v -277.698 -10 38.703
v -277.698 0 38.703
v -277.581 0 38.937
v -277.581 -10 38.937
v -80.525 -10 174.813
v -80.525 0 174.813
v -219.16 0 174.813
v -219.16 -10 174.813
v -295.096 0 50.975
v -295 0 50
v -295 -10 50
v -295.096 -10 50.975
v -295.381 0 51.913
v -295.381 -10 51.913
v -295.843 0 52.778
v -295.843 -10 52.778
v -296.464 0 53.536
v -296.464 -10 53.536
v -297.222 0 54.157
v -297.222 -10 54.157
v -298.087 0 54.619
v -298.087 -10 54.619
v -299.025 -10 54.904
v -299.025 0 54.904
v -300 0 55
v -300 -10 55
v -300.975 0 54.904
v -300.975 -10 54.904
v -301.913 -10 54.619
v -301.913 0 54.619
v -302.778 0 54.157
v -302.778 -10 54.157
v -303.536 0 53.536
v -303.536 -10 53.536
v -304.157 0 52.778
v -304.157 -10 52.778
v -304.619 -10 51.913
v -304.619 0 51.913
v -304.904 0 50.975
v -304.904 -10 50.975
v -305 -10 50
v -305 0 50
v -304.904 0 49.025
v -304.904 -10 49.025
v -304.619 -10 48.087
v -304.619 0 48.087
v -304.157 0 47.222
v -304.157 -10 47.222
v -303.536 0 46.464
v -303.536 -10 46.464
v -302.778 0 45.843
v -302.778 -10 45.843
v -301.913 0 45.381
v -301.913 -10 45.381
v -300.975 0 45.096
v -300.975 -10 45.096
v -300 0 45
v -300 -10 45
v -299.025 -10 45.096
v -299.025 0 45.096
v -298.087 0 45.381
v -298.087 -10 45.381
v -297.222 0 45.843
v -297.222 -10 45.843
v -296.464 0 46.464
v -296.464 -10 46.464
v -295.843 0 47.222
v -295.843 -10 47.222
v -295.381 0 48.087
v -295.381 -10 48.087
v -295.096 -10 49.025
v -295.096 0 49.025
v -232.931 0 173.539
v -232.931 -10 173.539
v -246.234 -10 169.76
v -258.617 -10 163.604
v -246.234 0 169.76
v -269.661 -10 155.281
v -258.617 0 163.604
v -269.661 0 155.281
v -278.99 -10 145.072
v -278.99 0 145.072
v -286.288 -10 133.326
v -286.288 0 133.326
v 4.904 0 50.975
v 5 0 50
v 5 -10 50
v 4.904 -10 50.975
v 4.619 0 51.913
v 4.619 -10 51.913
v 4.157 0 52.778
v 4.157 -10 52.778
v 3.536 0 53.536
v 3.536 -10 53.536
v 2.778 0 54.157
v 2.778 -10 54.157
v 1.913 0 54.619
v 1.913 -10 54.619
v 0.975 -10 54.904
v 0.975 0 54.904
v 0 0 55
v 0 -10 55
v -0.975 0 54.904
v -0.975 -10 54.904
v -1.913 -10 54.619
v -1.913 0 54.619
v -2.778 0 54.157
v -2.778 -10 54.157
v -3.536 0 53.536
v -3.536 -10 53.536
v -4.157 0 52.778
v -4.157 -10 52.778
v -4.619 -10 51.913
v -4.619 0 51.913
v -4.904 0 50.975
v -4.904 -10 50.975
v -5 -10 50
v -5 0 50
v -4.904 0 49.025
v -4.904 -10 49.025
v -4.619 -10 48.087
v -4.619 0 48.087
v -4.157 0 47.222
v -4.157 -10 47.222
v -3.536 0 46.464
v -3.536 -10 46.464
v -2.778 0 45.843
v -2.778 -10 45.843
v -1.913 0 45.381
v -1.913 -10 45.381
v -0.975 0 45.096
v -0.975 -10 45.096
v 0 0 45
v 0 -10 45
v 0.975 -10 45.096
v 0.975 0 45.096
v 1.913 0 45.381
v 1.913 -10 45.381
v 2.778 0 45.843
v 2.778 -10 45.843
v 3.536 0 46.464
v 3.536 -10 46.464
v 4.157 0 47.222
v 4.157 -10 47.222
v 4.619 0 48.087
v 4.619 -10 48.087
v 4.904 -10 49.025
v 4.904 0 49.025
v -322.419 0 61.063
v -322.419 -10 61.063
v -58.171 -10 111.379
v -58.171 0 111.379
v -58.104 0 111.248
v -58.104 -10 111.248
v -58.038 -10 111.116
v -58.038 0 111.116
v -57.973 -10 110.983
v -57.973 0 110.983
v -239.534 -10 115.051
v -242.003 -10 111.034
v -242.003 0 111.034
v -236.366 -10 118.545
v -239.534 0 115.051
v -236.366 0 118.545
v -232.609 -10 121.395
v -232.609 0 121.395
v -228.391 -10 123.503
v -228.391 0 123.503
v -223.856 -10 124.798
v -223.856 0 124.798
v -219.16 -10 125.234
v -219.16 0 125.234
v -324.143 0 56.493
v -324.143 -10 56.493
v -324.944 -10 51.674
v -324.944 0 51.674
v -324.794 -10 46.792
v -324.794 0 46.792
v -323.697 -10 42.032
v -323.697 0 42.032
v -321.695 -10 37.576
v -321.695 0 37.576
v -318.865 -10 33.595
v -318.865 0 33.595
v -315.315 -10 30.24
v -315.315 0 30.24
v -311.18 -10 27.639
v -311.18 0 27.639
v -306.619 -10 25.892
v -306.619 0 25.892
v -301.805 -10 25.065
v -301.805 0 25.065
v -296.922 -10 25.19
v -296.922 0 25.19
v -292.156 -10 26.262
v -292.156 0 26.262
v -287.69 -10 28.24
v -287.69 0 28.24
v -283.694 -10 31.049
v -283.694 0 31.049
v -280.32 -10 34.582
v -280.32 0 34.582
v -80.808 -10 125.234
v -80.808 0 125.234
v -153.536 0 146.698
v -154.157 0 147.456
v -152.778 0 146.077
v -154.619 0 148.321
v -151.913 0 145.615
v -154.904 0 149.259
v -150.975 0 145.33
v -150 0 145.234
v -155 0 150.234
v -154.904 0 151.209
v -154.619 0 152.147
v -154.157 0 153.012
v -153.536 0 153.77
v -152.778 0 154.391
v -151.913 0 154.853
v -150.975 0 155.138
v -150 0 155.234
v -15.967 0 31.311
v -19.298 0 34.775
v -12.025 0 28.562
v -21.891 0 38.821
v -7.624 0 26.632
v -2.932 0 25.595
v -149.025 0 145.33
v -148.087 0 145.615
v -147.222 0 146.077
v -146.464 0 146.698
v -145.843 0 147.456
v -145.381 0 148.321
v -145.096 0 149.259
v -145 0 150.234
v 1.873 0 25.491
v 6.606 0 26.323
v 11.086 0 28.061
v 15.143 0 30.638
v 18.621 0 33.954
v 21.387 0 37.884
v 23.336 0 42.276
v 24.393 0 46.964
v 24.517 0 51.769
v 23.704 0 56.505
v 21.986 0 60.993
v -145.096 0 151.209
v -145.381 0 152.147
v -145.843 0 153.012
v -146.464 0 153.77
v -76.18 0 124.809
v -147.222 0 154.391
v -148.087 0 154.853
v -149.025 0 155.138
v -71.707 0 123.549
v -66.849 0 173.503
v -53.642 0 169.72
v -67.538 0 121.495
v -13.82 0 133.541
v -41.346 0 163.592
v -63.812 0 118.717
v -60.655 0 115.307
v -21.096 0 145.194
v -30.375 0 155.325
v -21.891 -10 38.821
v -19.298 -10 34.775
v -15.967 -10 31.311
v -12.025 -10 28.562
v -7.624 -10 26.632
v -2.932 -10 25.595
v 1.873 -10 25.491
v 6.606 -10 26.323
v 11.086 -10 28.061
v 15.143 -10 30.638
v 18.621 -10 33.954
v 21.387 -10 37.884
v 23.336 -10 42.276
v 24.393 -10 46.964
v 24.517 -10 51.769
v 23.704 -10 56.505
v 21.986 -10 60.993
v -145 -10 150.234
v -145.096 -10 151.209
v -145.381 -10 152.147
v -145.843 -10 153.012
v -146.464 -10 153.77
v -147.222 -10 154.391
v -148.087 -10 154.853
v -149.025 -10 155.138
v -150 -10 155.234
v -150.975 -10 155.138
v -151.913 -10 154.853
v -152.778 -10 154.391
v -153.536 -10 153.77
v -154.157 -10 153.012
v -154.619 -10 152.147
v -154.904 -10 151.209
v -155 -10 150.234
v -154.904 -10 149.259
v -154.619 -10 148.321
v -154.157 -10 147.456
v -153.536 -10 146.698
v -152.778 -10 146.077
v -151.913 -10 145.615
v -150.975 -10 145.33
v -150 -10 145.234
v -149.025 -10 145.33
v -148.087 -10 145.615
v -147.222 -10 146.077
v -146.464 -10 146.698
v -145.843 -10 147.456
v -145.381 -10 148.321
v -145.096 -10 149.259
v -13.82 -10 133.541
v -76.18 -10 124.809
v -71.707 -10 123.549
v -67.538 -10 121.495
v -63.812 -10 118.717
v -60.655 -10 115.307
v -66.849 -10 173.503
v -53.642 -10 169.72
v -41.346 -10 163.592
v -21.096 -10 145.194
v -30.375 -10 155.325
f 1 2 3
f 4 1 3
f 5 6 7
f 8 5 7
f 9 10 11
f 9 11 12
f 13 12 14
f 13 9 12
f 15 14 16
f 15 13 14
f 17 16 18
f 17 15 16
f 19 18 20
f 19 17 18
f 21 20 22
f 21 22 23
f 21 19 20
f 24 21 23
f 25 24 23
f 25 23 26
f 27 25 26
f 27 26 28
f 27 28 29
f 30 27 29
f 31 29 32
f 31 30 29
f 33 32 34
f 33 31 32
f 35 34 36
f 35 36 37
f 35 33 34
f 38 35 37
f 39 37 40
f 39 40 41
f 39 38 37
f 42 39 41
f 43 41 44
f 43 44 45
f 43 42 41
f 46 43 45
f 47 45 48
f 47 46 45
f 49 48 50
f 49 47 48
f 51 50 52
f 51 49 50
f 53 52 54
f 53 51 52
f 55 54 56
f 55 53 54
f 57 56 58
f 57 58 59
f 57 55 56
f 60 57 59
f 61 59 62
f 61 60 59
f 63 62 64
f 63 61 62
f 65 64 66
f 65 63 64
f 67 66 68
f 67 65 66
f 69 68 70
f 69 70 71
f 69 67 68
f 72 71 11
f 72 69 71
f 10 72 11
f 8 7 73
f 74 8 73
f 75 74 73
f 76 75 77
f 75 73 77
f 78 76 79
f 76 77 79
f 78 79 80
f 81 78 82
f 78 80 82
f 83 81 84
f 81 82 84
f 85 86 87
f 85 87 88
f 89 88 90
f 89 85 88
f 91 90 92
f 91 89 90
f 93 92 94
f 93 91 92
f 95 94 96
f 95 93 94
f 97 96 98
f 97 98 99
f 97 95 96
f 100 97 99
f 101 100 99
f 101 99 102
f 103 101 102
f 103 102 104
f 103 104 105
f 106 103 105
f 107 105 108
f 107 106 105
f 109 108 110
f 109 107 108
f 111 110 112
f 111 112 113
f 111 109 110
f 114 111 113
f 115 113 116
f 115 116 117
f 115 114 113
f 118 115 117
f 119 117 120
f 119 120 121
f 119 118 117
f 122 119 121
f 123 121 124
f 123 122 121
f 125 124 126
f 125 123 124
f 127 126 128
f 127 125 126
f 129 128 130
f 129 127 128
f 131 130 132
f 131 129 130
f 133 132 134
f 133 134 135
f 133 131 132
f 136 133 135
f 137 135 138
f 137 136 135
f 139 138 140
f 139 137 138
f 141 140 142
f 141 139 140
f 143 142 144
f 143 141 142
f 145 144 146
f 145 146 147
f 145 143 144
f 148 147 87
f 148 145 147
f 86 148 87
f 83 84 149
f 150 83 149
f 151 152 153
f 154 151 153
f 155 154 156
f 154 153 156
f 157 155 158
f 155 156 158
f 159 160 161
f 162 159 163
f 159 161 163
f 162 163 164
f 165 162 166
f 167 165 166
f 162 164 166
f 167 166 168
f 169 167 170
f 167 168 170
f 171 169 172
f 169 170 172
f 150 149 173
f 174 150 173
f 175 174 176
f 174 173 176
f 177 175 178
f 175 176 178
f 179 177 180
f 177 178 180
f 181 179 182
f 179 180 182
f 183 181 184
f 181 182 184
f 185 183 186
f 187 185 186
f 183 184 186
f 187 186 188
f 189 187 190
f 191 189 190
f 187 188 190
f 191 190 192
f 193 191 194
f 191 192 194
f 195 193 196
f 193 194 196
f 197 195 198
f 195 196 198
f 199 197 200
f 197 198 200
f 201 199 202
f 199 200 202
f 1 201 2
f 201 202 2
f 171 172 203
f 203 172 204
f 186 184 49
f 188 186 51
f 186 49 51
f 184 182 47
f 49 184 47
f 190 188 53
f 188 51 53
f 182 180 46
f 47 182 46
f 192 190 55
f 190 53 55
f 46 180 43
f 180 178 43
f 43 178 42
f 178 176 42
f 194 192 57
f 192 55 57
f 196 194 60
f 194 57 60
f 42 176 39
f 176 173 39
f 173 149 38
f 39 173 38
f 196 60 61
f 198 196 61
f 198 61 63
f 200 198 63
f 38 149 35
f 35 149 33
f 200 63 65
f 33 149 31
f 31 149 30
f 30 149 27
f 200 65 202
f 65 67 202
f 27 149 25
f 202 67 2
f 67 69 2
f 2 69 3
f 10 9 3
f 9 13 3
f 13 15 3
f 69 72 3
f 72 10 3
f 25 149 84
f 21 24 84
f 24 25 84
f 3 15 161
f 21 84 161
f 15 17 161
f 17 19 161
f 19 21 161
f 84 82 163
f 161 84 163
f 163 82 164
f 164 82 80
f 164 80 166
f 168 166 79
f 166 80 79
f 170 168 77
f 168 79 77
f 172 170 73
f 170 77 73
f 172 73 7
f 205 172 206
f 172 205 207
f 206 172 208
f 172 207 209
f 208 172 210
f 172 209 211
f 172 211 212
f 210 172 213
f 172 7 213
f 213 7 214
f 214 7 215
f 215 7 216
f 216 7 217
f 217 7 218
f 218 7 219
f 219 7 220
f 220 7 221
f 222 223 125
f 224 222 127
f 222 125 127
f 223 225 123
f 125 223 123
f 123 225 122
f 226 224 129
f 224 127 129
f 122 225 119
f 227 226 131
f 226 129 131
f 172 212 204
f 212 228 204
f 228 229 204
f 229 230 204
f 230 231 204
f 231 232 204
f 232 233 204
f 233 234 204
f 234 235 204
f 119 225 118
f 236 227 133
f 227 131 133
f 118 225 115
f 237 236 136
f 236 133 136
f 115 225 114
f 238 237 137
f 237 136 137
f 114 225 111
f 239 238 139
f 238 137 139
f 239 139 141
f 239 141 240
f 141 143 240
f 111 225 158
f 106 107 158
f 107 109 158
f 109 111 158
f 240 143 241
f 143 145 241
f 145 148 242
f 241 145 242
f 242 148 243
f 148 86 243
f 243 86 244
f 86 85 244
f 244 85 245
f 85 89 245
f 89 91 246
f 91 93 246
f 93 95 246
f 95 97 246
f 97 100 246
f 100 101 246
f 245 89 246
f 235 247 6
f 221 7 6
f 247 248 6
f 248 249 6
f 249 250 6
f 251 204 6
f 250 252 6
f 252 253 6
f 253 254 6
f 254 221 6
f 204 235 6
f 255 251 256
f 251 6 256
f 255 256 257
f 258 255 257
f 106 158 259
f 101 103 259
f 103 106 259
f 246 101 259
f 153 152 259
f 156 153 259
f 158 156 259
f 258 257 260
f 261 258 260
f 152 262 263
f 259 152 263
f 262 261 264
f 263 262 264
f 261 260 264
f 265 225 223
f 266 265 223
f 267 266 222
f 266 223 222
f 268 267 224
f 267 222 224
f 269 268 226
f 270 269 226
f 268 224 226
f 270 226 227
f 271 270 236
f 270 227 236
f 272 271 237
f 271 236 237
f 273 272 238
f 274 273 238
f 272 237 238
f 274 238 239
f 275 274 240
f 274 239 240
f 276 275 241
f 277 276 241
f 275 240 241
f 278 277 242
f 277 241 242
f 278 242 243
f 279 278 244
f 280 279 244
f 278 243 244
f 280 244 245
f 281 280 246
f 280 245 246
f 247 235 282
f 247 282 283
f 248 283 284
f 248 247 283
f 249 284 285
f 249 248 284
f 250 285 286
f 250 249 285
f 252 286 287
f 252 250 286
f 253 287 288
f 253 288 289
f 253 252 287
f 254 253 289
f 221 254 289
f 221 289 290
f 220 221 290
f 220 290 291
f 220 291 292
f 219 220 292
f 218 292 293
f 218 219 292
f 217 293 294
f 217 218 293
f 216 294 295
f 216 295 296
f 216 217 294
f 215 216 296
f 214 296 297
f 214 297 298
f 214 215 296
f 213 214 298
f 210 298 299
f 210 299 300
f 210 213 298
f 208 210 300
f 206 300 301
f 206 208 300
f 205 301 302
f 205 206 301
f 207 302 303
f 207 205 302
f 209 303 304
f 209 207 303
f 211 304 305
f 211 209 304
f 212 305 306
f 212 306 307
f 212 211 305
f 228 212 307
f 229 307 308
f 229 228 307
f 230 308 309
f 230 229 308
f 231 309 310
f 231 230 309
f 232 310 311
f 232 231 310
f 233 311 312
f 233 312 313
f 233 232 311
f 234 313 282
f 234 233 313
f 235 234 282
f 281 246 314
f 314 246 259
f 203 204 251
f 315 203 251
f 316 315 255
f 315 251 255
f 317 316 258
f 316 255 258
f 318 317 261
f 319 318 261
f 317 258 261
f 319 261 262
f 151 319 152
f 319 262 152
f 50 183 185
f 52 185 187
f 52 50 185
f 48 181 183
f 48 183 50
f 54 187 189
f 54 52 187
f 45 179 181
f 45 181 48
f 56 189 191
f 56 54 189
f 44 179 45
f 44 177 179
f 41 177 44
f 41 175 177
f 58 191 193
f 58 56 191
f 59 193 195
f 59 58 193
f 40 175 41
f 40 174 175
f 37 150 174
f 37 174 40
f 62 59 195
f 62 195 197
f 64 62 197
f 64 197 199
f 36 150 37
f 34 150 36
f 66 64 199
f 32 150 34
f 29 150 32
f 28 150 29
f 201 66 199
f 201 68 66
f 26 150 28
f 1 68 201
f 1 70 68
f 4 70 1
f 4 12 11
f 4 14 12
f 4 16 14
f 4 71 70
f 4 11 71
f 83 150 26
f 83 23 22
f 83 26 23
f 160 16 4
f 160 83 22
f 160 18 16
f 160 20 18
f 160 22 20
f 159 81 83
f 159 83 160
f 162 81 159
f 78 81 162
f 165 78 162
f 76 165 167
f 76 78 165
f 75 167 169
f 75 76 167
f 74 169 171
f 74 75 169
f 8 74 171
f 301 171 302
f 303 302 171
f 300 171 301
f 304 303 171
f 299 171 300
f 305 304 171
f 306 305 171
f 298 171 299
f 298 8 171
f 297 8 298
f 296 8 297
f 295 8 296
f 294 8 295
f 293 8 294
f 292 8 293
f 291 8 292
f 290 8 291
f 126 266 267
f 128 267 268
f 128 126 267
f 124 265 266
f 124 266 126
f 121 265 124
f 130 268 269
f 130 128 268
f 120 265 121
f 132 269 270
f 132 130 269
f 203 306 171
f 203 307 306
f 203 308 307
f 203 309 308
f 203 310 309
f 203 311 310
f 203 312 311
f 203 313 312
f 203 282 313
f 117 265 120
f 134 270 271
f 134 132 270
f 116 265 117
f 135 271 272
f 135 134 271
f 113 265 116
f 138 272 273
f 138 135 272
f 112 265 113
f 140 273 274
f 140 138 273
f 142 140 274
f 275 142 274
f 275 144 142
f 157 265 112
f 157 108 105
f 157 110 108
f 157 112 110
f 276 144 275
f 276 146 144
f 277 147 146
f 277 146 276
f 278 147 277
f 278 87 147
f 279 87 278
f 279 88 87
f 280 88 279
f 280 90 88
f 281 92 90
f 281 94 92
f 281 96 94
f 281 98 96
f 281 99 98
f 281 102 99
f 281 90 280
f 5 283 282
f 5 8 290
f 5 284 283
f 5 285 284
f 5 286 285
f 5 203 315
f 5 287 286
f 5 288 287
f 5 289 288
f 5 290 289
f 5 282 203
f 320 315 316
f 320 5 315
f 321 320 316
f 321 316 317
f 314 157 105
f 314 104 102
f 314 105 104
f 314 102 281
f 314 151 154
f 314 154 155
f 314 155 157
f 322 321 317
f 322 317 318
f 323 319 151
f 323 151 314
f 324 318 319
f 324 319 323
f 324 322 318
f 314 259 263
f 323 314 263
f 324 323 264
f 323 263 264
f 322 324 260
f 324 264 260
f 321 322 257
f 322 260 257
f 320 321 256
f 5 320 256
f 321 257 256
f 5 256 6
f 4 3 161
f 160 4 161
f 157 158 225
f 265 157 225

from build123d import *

# Parameters (mm, degrees)
F0_R     = 5
F1_DEPTH = 10


with BuildPart() as f1:
    # F0 (on Front) → F1 (new body)
    with BuildSketch(Plane.XZ):
        with BuildLine():
            ThreePointArc((-219.160475, 174.812716), (-258.617076, 163.603922), (-286.288055, 133.32559))
            Line((-286.288055, 133.32559), (-322.419221, 61.063257))
            ThreePointArc((-322.419221, 61.063257), (-311.180493, 27.639014), (-277.697862, 38.702578))
            Line((-277.697862, 38.702578), (-277.580779, 38.936743))
            Line((-277.580779, 38.936743), (-242.002863, 111.033879))
            ThreePointArc((-242.002863, 111.033879), (-232.608699, 121.394639), (-219.160475, 125.234029))
            Line((-219.160475, 125.234029), (-80.808, 125.234029))
            ThreePointArc((-80.808, 125.234029), (-67.537861, 121.495487), (-58.170905, 111.37949))
            ThreePointArc((-58.170905, 111.37949), (-58.070965, 111.181769), (-57.972752, 110.983184))
            Line((-57.972752, 110.983184), (-21.891489, 38.820657))
            ThreePointArc((-21.891489, 38.820657), (11.086202, 28.061196), (21.985722, 60.992861))
            Line((21.985722, 60.992861), (-13.81966, 133.54102))
            ThreePointArc((-13.81966, 133.54102), (-41.346483, 163.59247), (-80.52456, 174.812716))
            Line((-80.52456, 174.812716), (-219.160475, 174.812716))
        make_face()
        with Locations((-300, 50)):
            Circle(F0_R, mode=Mode.SUBTRACT)
        with Locations((0, 50)):
            Circle(F0_R, mode=Mode.SUBTRACT)
        with Locations((-150, 150.234029)):
            Circle(F0_R, mode=Mode.SUBTRACT)
    extrude(amount=F1_DEPTH)


solid = f1.part
